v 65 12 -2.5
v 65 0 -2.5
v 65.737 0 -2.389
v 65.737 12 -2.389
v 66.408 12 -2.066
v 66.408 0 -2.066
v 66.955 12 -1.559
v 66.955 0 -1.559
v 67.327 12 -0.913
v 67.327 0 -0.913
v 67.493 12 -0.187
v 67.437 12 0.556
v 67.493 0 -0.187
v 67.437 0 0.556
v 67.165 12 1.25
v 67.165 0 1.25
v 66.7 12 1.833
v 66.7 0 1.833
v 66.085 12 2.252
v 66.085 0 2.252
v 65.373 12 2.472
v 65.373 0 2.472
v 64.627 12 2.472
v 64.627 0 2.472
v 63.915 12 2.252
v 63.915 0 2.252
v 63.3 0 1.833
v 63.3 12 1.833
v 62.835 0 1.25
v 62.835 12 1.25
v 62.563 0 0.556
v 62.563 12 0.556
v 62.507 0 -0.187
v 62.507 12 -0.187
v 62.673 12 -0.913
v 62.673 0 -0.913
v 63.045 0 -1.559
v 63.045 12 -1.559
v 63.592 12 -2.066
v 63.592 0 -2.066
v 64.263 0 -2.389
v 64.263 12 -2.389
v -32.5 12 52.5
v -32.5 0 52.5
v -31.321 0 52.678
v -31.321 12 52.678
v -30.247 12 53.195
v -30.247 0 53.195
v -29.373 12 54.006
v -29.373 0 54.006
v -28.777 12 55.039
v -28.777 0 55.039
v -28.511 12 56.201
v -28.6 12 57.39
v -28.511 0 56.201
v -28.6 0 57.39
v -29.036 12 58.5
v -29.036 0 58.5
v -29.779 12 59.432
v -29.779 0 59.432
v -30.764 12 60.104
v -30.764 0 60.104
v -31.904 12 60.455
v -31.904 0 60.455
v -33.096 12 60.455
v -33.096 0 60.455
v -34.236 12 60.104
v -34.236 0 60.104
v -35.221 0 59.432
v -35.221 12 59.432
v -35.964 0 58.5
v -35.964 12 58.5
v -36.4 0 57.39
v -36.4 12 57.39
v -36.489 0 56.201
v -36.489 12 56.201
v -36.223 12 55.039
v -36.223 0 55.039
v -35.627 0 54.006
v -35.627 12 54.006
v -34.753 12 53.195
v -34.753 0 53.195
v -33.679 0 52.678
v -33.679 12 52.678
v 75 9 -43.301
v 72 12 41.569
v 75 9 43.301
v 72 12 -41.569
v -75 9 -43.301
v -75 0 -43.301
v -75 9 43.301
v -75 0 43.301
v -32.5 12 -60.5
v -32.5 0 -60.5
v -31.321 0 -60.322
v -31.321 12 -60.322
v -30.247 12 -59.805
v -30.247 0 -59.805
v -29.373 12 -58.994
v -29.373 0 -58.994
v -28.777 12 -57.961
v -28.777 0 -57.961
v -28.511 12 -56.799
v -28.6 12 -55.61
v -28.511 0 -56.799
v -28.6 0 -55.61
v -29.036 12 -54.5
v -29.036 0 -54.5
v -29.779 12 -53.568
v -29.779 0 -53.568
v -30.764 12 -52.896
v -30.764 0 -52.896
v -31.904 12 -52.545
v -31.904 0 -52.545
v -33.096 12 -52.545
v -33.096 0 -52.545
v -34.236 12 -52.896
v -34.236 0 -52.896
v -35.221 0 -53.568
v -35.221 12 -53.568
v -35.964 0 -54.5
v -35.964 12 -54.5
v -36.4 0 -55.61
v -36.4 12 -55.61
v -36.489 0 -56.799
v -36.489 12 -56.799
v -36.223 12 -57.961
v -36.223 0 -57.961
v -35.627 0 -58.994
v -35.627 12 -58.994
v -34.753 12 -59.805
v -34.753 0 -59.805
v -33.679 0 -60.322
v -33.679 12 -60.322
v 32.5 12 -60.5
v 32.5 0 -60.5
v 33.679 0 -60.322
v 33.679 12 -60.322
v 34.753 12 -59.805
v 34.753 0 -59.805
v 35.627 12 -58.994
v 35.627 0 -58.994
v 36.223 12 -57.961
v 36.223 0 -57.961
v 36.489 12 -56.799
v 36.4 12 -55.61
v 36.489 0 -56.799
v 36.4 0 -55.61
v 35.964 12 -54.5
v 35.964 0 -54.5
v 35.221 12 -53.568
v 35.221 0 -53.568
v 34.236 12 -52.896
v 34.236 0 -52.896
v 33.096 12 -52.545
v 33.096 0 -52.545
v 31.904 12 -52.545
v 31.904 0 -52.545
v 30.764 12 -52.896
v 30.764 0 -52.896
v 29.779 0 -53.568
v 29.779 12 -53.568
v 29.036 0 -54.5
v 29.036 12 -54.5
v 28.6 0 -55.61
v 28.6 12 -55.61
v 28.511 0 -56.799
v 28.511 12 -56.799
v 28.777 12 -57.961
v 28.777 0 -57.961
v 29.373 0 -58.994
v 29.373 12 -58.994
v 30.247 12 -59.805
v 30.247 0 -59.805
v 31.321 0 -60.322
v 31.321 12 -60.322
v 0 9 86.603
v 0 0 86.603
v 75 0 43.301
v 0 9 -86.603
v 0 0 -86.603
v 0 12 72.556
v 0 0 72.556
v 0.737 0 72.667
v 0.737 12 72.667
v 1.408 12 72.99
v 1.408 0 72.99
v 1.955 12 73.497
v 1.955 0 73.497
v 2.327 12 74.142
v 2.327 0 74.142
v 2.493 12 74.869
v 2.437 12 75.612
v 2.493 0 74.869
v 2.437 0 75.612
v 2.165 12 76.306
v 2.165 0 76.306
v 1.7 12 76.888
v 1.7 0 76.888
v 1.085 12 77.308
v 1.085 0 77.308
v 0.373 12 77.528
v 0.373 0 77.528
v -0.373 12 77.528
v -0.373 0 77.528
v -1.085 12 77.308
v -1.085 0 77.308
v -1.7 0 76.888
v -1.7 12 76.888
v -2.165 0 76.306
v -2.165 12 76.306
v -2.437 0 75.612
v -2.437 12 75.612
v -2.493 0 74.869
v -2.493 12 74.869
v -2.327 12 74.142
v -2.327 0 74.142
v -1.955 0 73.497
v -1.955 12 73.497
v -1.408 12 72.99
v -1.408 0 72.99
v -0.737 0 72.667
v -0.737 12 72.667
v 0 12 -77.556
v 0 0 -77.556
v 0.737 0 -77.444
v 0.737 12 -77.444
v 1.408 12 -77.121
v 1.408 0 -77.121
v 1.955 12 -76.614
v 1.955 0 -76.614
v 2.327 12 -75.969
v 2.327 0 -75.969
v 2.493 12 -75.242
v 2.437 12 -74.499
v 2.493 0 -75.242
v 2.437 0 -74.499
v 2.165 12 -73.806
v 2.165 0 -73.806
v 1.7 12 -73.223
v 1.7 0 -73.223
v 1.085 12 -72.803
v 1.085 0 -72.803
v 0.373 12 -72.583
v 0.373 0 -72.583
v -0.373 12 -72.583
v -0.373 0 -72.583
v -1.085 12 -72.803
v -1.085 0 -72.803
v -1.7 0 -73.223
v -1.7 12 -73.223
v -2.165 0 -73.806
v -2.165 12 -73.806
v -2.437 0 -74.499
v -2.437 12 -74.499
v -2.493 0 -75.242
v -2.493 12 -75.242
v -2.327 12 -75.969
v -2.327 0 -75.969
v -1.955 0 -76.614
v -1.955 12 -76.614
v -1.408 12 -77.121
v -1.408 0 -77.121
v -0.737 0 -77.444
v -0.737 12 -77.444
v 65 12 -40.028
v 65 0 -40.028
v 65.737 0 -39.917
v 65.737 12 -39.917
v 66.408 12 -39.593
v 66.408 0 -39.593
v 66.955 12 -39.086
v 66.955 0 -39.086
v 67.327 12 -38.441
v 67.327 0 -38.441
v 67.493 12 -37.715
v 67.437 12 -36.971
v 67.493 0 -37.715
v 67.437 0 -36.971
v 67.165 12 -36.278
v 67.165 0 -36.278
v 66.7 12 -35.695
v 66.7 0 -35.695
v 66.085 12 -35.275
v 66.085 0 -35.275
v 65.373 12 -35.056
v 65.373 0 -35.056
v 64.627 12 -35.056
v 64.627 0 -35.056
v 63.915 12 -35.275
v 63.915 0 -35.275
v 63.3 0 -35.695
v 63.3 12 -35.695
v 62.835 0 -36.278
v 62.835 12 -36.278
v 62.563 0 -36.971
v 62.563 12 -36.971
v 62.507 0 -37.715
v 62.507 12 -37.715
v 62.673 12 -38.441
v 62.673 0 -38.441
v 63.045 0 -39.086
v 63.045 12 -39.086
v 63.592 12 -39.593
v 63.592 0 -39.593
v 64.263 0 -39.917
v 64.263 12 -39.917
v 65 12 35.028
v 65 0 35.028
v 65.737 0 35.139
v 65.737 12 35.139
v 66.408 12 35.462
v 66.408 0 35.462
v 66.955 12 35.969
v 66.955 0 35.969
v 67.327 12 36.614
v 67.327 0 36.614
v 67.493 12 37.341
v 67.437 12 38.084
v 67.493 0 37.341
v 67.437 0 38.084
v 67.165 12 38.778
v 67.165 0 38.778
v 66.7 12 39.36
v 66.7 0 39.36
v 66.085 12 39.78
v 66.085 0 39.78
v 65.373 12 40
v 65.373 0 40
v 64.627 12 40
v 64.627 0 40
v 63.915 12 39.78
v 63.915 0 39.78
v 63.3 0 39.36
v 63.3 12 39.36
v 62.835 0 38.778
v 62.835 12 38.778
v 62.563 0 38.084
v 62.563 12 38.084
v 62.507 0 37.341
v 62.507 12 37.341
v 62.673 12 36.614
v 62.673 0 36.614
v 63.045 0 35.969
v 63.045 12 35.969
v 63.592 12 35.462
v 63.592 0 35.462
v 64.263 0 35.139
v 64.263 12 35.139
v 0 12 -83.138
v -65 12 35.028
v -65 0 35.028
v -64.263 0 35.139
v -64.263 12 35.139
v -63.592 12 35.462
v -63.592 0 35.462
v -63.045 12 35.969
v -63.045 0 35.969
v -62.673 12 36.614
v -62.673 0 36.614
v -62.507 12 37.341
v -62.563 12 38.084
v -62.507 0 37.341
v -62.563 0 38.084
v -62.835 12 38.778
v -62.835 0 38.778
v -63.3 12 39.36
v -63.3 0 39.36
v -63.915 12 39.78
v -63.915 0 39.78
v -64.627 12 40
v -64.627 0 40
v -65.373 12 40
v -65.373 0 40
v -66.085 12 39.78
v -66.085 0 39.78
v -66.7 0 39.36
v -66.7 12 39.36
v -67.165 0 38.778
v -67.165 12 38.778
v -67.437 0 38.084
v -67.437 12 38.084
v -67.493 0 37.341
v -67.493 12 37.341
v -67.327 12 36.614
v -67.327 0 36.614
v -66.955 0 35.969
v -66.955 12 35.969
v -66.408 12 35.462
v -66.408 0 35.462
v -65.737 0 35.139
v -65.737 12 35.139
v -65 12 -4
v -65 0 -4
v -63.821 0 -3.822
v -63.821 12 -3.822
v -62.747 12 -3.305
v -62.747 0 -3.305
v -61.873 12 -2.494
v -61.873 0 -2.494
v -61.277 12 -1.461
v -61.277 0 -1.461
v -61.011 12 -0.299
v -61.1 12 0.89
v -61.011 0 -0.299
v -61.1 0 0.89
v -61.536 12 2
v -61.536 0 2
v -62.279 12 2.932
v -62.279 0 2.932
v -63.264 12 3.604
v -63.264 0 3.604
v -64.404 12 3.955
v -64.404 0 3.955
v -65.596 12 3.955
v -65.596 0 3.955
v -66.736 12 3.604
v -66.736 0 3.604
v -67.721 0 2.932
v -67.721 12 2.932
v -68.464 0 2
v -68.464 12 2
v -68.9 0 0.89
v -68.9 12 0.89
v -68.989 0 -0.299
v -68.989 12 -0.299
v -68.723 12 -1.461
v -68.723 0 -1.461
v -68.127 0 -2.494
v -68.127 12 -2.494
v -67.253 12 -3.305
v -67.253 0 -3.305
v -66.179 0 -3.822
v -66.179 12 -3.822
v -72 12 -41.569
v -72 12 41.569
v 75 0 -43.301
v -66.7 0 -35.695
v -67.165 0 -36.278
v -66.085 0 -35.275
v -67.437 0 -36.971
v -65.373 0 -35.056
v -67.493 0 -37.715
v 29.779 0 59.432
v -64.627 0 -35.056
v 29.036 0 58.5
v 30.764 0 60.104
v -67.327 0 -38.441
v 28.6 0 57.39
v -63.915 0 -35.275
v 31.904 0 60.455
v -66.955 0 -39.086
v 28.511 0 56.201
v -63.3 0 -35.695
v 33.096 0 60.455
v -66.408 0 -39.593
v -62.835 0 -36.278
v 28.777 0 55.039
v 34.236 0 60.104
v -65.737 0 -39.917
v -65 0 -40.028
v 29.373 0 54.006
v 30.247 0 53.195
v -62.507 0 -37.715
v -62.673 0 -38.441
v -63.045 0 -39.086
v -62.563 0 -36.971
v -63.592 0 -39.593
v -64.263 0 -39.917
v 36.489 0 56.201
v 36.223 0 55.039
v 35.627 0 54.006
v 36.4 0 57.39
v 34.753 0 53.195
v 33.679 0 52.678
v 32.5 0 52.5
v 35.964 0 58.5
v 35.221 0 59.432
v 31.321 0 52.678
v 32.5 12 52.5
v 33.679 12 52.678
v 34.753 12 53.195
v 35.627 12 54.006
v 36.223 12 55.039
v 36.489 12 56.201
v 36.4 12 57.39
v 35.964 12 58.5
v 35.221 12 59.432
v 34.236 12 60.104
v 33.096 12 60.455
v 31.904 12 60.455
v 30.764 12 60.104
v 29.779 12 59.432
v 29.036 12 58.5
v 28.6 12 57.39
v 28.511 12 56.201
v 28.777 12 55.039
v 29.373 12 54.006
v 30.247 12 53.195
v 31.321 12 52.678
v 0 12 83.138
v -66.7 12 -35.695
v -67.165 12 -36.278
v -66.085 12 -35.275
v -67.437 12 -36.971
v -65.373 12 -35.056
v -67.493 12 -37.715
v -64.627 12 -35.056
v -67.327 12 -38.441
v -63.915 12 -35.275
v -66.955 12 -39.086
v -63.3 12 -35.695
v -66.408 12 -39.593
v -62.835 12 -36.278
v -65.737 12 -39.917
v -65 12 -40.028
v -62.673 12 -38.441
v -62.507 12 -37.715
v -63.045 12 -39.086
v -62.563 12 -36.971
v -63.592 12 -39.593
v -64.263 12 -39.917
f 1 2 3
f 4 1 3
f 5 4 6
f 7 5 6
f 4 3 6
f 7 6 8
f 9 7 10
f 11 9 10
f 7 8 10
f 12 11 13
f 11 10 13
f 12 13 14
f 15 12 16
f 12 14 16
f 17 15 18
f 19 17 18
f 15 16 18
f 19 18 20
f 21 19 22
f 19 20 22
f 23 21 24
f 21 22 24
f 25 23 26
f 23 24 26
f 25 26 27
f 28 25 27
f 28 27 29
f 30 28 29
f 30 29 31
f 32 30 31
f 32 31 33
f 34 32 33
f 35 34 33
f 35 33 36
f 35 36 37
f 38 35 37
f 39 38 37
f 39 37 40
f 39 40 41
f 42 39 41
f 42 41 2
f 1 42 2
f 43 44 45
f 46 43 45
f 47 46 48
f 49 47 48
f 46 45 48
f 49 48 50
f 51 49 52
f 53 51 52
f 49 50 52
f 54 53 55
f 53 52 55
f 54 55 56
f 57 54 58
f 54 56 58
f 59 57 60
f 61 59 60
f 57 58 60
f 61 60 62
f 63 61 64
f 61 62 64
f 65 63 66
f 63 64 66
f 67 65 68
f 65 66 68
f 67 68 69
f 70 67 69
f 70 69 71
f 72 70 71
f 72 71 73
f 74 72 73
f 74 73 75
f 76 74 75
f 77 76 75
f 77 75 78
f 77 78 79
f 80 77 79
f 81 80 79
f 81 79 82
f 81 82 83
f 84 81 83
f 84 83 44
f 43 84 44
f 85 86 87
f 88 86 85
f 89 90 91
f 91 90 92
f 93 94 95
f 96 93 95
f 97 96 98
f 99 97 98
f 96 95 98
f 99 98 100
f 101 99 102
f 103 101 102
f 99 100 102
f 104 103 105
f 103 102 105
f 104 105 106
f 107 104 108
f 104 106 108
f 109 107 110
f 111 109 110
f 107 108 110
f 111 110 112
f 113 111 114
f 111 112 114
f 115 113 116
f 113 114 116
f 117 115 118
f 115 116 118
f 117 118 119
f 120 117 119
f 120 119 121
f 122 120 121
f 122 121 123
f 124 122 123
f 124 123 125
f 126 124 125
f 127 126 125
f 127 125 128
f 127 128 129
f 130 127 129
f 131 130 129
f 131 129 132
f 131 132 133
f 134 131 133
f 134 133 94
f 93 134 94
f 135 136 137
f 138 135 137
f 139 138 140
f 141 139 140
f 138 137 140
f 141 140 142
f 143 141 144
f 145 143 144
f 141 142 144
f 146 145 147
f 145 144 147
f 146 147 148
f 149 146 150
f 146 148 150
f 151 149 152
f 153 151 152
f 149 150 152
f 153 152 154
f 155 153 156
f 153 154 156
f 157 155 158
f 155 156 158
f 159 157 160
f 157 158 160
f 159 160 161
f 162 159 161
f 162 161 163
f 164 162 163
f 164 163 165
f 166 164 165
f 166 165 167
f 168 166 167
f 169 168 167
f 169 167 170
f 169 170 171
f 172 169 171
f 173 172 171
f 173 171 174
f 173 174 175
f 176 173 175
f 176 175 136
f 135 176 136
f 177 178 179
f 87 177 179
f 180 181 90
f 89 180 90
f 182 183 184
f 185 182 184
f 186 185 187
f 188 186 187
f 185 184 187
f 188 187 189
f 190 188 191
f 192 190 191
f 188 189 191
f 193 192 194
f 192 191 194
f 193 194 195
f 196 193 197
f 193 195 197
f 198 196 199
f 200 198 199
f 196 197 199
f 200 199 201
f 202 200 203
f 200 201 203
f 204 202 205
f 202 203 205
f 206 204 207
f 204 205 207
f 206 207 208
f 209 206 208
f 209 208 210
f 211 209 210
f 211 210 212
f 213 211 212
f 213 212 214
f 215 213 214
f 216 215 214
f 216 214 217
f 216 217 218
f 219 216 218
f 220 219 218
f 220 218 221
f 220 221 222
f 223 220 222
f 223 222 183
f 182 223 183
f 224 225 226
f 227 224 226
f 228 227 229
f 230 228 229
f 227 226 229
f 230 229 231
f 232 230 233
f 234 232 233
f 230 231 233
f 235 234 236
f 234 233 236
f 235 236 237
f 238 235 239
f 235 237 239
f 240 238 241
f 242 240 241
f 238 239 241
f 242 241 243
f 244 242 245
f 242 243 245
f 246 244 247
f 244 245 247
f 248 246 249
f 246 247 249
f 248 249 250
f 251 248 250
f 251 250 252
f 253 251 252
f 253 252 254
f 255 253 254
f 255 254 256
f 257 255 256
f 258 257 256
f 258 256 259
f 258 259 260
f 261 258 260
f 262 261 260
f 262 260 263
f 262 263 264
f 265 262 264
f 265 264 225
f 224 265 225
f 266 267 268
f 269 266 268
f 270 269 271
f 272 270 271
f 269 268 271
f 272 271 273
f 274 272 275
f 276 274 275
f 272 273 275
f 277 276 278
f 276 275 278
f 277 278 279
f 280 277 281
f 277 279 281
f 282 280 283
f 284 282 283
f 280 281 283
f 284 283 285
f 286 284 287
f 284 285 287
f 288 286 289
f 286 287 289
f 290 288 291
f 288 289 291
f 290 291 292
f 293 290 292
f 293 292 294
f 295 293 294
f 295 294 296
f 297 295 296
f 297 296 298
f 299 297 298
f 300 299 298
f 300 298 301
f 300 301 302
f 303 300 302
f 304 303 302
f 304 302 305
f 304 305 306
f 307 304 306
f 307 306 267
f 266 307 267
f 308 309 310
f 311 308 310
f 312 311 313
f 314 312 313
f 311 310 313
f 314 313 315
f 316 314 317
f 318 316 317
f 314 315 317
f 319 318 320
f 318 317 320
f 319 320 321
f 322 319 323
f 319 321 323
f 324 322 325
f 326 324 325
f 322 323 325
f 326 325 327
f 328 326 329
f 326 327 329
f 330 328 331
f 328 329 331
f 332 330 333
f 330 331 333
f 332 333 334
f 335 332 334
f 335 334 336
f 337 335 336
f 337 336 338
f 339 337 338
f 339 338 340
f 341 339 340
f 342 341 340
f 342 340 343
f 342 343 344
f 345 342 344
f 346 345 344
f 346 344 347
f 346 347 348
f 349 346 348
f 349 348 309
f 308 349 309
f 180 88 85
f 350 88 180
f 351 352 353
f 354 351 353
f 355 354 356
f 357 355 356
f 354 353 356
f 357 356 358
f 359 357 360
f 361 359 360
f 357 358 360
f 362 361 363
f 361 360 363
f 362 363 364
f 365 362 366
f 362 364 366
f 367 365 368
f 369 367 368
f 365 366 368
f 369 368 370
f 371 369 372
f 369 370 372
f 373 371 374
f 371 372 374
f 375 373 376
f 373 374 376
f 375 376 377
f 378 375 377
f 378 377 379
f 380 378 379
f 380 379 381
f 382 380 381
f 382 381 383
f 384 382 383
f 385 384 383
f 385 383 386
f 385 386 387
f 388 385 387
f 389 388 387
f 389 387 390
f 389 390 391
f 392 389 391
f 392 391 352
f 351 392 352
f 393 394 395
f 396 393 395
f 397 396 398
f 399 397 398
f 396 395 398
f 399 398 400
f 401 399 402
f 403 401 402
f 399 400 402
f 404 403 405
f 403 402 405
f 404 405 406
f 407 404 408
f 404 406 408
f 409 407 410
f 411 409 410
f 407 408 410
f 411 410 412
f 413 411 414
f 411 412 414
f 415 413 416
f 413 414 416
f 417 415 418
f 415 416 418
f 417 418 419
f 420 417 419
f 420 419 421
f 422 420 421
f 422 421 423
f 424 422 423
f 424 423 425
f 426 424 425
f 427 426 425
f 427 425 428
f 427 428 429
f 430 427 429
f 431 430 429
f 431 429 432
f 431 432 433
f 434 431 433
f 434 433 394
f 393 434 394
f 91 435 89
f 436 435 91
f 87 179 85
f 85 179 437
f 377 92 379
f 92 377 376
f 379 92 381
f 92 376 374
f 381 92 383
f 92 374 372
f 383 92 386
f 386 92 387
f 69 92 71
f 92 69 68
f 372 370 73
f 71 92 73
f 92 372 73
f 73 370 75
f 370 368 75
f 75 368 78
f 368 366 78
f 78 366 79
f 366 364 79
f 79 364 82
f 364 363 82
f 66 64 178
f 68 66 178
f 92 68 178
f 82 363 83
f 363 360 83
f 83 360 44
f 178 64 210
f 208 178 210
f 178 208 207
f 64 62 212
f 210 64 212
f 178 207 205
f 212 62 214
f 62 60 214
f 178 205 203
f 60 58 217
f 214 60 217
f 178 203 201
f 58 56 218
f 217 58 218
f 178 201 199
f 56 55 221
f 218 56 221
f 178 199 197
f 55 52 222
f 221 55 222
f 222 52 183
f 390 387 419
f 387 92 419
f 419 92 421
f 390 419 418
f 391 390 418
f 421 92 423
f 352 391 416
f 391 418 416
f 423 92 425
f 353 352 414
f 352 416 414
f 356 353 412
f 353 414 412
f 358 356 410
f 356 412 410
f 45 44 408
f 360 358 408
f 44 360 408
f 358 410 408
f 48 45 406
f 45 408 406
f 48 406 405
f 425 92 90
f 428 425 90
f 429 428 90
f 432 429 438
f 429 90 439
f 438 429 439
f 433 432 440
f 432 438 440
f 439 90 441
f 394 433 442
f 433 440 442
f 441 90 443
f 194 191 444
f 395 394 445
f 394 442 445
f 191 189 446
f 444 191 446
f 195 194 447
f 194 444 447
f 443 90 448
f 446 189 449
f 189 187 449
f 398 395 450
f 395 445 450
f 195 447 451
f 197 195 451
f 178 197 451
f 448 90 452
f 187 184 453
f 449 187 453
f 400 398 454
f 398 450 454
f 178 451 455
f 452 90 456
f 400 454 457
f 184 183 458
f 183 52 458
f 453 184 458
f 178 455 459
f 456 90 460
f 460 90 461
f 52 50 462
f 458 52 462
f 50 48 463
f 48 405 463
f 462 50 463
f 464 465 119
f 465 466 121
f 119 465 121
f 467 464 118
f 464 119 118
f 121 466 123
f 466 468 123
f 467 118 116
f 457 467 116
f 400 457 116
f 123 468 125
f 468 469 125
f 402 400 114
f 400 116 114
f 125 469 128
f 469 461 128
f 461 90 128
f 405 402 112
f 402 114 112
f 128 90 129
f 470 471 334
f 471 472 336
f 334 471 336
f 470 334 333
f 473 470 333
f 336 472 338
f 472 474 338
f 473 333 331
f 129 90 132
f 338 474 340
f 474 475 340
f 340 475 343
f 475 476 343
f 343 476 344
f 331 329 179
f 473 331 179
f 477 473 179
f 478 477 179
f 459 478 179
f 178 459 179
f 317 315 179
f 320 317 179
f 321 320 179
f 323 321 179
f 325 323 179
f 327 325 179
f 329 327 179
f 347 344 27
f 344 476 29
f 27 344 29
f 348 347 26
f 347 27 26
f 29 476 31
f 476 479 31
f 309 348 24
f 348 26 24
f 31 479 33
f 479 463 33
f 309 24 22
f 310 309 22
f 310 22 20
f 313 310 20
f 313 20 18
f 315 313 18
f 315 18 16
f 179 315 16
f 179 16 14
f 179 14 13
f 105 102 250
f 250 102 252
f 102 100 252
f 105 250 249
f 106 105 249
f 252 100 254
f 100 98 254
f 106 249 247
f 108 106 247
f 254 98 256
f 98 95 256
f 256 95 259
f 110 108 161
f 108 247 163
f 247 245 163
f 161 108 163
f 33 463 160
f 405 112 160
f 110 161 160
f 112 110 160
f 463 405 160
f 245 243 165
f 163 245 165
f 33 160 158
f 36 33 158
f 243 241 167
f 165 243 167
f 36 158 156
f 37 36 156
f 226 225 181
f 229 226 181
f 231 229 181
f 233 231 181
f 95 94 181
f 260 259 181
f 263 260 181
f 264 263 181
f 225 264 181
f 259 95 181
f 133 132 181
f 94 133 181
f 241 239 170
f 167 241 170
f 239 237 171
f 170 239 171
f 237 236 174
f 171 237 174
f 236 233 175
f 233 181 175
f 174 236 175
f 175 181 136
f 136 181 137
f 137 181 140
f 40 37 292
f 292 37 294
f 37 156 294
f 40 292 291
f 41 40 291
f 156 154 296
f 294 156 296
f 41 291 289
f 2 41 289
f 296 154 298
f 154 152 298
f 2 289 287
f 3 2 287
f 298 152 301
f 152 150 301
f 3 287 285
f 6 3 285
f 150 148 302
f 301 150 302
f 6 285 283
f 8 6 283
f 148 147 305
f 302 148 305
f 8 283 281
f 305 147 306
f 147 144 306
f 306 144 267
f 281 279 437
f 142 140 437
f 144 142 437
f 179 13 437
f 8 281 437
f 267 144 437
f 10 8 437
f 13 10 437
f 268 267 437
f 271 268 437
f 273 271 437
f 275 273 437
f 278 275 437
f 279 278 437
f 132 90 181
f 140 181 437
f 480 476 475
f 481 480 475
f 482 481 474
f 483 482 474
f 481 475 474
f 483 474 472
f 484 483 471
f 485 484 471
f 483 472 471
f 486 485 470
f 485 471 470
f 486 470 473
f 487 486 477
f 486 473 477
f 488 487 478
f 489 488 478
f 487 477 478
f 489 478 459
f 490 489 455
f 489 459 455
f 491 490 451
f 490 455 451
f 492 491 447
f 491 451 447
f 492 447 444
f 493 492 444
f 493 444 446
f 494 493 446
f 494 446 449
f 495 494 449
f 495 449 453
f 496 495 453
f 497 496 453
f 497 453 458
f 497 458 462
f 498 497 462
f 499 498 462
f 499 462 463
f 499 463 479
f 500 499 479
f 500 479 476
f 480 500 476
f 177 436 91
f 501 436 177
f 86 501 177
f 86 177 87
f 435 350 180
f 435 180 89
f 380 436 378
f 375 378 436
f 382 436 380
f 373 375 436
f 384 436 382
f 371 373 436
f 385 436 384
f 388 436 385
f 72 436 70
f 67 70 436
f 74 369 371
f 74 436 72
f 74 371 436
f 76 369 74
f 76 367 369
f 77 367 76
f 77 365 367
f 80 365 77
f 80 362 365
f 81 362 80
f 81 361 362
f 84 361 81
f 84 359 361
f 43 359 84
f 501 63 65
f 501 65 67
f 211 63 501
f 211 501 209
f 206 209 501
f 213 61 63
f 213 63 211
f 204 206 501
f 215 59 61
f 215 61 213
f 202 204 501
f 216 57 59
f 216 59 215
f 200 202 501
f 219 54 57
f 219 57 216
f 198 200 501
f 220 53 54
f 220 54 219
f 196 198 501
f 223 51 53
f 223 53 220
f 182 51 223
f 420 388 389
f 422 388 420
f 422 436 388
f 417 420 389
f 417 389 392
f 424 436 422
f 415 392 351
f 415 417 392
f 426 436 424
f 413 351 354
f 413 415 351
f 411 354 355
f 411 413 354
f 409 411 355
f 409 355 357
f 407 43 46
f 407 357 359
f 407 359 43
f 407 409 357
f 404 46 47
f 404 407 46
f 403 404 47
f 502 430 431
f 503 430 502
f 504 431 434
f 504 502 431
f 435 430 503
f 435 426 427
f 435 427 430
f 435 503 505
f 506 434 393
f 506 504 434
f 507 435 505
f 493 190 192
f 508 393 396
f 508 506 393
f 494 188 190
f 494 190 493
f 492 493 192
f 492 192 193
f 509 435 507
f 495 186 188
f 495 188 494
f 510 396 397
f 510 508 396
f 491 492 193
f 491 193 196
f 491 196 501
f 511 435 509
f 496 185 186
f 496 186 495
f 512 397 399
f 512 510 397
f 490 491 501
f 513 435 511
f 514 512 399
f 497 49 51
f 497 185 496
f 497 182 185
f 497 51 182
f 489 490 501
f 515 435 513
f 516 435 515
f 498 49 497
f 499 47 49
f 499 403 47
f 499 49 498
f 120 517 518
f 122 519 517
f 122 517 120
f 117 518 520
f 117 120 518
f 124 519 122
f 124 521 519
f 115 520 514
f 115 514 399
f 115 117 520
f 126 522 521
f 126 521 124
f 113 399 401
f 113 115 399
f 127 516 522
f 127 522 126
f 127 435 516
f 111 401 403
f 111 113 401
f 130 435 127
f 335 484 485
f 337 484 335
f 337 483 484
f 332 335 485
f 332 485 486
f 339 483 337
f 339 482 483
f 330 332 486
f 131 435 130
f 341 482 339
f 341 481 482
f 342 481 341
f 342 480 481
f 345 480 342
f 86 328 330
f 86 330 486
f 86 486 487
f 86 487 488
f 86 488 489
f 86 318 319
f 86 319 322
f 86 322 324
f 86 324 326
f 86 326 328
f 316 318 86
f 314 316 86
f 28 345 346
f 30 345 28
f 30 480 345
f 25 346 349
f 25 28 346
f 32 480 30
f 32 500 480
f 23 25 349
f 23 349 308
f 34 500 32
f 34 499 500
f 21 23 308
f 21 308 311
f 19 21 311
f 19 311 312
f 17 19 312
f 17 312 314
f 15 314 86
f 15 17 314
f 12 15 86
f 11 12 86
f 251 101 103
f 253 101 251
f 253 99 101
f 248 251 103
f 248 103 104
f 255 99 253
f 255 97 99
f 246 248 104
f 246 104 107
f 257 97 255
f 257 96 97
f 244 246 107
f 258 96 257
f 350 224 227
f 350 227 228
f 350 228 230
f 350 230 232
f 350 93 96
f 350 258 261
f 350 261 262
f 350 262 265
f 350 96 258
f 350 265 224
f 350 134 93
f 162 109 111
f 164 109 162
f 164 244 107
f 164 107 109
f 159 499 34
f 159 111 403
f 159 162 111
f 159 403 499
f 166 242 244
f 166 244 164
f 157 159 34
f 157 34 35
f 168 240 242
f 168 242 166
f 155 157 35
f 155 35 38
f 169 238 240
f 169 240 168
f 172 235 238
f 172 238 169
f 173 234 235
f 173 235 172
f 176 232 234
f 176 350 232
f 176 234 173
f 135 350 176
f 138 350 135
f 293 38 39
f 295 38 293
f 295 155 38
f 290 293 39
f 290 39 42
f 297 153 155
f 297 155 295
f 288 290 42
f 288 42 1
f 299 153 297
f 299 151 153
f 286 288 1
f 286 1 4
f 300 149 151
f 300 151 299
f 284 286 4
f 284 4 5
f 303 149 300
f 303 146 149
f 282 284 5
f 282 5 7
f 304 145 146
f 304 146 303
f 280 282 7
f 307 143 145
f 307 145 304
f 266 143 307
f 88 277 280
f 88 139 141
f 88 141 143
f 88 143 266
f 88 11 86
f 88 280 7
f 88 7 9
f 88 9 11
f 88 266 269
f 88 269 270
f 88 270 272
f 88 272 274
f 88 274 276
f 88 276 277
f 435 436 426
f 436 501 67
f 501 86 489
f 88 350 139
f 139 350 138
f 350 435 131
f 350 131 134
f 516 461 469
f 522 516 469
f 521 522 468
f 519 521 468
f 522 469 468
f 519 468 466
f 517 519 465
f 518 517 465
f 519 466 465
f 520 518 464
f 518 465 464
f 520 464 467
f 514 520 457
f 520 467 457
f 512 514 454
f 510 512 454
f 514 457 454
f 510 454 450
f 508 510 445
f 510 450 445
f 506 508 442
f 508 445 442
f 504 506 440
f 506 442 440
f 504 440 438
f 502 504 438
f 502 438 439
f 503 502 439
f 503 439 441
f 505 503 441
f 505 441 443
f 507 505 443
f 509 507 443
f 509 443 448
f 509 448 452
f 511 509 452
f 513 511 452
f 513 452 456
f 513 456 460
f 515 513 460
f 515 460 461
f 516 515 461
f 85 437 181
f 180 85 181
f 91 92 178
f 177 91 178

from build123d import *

# Parameters (mm, degrees)
EXTRUDE_2_DEPTH    = 12
CHAMFER_1_SIZE     = 3
HOLE_WIZARD_M6_2_D = 5
F_8_0MM_1_D        = 8


with BuildPart() as part:
    # 草圖2 → 填料-伸長2 (new body)
    with BuildSketch(Plane(origin=(0, 0, 0), x_dir=(1, 0, 0), z_dir=(0, 1, 0))):
        Polygon((0, 86.602540378), (-75, 43.301270189), (-75, -43.301270189), (0, -86.602540378), (75, -43.301270189), (75, 43.301270189), align=None)
    extrude(amount=EXTRUDE_2_DEPTH)

    # 導角1
    chamfer_1_edges = [part.edges().sort_by_distance(p)[0] for p in [
        (-75, 12, 0),
        (-37.5, 12, 64.951905284),
        (37.5, 12, 64.951905284),
        (75, 12, 0),
        (37.5, 12, -64.951905284),
        (-37.5, 12, -64.951905284),
    ]]
    chamfer(chamfer_1_edges, length=CHAMFER_1_SIZE)

    # M6 螺紋孔2 (through all)
    with Locations(Plane(origin=(-65, 12, 37.527767497), x_dir=(0, 0, 1), z_dir=(0, 1, 0))):
        with Locations((0, 0), (-75.055534994, 0), (-112.583302492, 65), (-75.055534994, 130), (-37.527767497, 130), (37.527767498, 65), (0, 130)):
            Hole(HOLE_WIZARD_M6_2_D / 2)

    # Ø8.0mm 定位孔1 (through all)
    with Locations(Plane(origin=(-65, 12, 0), x_dir=(0, 0, 1), z_dir=(0, 1, 0))):
        with Locations((0, 0), (56.5, 32.5), (56.5, 97.5), (-56.5, 97.5), (-56.5, 32.5)):
            Hole(F_8_0MM_1_D / 2)


solid = part.part
